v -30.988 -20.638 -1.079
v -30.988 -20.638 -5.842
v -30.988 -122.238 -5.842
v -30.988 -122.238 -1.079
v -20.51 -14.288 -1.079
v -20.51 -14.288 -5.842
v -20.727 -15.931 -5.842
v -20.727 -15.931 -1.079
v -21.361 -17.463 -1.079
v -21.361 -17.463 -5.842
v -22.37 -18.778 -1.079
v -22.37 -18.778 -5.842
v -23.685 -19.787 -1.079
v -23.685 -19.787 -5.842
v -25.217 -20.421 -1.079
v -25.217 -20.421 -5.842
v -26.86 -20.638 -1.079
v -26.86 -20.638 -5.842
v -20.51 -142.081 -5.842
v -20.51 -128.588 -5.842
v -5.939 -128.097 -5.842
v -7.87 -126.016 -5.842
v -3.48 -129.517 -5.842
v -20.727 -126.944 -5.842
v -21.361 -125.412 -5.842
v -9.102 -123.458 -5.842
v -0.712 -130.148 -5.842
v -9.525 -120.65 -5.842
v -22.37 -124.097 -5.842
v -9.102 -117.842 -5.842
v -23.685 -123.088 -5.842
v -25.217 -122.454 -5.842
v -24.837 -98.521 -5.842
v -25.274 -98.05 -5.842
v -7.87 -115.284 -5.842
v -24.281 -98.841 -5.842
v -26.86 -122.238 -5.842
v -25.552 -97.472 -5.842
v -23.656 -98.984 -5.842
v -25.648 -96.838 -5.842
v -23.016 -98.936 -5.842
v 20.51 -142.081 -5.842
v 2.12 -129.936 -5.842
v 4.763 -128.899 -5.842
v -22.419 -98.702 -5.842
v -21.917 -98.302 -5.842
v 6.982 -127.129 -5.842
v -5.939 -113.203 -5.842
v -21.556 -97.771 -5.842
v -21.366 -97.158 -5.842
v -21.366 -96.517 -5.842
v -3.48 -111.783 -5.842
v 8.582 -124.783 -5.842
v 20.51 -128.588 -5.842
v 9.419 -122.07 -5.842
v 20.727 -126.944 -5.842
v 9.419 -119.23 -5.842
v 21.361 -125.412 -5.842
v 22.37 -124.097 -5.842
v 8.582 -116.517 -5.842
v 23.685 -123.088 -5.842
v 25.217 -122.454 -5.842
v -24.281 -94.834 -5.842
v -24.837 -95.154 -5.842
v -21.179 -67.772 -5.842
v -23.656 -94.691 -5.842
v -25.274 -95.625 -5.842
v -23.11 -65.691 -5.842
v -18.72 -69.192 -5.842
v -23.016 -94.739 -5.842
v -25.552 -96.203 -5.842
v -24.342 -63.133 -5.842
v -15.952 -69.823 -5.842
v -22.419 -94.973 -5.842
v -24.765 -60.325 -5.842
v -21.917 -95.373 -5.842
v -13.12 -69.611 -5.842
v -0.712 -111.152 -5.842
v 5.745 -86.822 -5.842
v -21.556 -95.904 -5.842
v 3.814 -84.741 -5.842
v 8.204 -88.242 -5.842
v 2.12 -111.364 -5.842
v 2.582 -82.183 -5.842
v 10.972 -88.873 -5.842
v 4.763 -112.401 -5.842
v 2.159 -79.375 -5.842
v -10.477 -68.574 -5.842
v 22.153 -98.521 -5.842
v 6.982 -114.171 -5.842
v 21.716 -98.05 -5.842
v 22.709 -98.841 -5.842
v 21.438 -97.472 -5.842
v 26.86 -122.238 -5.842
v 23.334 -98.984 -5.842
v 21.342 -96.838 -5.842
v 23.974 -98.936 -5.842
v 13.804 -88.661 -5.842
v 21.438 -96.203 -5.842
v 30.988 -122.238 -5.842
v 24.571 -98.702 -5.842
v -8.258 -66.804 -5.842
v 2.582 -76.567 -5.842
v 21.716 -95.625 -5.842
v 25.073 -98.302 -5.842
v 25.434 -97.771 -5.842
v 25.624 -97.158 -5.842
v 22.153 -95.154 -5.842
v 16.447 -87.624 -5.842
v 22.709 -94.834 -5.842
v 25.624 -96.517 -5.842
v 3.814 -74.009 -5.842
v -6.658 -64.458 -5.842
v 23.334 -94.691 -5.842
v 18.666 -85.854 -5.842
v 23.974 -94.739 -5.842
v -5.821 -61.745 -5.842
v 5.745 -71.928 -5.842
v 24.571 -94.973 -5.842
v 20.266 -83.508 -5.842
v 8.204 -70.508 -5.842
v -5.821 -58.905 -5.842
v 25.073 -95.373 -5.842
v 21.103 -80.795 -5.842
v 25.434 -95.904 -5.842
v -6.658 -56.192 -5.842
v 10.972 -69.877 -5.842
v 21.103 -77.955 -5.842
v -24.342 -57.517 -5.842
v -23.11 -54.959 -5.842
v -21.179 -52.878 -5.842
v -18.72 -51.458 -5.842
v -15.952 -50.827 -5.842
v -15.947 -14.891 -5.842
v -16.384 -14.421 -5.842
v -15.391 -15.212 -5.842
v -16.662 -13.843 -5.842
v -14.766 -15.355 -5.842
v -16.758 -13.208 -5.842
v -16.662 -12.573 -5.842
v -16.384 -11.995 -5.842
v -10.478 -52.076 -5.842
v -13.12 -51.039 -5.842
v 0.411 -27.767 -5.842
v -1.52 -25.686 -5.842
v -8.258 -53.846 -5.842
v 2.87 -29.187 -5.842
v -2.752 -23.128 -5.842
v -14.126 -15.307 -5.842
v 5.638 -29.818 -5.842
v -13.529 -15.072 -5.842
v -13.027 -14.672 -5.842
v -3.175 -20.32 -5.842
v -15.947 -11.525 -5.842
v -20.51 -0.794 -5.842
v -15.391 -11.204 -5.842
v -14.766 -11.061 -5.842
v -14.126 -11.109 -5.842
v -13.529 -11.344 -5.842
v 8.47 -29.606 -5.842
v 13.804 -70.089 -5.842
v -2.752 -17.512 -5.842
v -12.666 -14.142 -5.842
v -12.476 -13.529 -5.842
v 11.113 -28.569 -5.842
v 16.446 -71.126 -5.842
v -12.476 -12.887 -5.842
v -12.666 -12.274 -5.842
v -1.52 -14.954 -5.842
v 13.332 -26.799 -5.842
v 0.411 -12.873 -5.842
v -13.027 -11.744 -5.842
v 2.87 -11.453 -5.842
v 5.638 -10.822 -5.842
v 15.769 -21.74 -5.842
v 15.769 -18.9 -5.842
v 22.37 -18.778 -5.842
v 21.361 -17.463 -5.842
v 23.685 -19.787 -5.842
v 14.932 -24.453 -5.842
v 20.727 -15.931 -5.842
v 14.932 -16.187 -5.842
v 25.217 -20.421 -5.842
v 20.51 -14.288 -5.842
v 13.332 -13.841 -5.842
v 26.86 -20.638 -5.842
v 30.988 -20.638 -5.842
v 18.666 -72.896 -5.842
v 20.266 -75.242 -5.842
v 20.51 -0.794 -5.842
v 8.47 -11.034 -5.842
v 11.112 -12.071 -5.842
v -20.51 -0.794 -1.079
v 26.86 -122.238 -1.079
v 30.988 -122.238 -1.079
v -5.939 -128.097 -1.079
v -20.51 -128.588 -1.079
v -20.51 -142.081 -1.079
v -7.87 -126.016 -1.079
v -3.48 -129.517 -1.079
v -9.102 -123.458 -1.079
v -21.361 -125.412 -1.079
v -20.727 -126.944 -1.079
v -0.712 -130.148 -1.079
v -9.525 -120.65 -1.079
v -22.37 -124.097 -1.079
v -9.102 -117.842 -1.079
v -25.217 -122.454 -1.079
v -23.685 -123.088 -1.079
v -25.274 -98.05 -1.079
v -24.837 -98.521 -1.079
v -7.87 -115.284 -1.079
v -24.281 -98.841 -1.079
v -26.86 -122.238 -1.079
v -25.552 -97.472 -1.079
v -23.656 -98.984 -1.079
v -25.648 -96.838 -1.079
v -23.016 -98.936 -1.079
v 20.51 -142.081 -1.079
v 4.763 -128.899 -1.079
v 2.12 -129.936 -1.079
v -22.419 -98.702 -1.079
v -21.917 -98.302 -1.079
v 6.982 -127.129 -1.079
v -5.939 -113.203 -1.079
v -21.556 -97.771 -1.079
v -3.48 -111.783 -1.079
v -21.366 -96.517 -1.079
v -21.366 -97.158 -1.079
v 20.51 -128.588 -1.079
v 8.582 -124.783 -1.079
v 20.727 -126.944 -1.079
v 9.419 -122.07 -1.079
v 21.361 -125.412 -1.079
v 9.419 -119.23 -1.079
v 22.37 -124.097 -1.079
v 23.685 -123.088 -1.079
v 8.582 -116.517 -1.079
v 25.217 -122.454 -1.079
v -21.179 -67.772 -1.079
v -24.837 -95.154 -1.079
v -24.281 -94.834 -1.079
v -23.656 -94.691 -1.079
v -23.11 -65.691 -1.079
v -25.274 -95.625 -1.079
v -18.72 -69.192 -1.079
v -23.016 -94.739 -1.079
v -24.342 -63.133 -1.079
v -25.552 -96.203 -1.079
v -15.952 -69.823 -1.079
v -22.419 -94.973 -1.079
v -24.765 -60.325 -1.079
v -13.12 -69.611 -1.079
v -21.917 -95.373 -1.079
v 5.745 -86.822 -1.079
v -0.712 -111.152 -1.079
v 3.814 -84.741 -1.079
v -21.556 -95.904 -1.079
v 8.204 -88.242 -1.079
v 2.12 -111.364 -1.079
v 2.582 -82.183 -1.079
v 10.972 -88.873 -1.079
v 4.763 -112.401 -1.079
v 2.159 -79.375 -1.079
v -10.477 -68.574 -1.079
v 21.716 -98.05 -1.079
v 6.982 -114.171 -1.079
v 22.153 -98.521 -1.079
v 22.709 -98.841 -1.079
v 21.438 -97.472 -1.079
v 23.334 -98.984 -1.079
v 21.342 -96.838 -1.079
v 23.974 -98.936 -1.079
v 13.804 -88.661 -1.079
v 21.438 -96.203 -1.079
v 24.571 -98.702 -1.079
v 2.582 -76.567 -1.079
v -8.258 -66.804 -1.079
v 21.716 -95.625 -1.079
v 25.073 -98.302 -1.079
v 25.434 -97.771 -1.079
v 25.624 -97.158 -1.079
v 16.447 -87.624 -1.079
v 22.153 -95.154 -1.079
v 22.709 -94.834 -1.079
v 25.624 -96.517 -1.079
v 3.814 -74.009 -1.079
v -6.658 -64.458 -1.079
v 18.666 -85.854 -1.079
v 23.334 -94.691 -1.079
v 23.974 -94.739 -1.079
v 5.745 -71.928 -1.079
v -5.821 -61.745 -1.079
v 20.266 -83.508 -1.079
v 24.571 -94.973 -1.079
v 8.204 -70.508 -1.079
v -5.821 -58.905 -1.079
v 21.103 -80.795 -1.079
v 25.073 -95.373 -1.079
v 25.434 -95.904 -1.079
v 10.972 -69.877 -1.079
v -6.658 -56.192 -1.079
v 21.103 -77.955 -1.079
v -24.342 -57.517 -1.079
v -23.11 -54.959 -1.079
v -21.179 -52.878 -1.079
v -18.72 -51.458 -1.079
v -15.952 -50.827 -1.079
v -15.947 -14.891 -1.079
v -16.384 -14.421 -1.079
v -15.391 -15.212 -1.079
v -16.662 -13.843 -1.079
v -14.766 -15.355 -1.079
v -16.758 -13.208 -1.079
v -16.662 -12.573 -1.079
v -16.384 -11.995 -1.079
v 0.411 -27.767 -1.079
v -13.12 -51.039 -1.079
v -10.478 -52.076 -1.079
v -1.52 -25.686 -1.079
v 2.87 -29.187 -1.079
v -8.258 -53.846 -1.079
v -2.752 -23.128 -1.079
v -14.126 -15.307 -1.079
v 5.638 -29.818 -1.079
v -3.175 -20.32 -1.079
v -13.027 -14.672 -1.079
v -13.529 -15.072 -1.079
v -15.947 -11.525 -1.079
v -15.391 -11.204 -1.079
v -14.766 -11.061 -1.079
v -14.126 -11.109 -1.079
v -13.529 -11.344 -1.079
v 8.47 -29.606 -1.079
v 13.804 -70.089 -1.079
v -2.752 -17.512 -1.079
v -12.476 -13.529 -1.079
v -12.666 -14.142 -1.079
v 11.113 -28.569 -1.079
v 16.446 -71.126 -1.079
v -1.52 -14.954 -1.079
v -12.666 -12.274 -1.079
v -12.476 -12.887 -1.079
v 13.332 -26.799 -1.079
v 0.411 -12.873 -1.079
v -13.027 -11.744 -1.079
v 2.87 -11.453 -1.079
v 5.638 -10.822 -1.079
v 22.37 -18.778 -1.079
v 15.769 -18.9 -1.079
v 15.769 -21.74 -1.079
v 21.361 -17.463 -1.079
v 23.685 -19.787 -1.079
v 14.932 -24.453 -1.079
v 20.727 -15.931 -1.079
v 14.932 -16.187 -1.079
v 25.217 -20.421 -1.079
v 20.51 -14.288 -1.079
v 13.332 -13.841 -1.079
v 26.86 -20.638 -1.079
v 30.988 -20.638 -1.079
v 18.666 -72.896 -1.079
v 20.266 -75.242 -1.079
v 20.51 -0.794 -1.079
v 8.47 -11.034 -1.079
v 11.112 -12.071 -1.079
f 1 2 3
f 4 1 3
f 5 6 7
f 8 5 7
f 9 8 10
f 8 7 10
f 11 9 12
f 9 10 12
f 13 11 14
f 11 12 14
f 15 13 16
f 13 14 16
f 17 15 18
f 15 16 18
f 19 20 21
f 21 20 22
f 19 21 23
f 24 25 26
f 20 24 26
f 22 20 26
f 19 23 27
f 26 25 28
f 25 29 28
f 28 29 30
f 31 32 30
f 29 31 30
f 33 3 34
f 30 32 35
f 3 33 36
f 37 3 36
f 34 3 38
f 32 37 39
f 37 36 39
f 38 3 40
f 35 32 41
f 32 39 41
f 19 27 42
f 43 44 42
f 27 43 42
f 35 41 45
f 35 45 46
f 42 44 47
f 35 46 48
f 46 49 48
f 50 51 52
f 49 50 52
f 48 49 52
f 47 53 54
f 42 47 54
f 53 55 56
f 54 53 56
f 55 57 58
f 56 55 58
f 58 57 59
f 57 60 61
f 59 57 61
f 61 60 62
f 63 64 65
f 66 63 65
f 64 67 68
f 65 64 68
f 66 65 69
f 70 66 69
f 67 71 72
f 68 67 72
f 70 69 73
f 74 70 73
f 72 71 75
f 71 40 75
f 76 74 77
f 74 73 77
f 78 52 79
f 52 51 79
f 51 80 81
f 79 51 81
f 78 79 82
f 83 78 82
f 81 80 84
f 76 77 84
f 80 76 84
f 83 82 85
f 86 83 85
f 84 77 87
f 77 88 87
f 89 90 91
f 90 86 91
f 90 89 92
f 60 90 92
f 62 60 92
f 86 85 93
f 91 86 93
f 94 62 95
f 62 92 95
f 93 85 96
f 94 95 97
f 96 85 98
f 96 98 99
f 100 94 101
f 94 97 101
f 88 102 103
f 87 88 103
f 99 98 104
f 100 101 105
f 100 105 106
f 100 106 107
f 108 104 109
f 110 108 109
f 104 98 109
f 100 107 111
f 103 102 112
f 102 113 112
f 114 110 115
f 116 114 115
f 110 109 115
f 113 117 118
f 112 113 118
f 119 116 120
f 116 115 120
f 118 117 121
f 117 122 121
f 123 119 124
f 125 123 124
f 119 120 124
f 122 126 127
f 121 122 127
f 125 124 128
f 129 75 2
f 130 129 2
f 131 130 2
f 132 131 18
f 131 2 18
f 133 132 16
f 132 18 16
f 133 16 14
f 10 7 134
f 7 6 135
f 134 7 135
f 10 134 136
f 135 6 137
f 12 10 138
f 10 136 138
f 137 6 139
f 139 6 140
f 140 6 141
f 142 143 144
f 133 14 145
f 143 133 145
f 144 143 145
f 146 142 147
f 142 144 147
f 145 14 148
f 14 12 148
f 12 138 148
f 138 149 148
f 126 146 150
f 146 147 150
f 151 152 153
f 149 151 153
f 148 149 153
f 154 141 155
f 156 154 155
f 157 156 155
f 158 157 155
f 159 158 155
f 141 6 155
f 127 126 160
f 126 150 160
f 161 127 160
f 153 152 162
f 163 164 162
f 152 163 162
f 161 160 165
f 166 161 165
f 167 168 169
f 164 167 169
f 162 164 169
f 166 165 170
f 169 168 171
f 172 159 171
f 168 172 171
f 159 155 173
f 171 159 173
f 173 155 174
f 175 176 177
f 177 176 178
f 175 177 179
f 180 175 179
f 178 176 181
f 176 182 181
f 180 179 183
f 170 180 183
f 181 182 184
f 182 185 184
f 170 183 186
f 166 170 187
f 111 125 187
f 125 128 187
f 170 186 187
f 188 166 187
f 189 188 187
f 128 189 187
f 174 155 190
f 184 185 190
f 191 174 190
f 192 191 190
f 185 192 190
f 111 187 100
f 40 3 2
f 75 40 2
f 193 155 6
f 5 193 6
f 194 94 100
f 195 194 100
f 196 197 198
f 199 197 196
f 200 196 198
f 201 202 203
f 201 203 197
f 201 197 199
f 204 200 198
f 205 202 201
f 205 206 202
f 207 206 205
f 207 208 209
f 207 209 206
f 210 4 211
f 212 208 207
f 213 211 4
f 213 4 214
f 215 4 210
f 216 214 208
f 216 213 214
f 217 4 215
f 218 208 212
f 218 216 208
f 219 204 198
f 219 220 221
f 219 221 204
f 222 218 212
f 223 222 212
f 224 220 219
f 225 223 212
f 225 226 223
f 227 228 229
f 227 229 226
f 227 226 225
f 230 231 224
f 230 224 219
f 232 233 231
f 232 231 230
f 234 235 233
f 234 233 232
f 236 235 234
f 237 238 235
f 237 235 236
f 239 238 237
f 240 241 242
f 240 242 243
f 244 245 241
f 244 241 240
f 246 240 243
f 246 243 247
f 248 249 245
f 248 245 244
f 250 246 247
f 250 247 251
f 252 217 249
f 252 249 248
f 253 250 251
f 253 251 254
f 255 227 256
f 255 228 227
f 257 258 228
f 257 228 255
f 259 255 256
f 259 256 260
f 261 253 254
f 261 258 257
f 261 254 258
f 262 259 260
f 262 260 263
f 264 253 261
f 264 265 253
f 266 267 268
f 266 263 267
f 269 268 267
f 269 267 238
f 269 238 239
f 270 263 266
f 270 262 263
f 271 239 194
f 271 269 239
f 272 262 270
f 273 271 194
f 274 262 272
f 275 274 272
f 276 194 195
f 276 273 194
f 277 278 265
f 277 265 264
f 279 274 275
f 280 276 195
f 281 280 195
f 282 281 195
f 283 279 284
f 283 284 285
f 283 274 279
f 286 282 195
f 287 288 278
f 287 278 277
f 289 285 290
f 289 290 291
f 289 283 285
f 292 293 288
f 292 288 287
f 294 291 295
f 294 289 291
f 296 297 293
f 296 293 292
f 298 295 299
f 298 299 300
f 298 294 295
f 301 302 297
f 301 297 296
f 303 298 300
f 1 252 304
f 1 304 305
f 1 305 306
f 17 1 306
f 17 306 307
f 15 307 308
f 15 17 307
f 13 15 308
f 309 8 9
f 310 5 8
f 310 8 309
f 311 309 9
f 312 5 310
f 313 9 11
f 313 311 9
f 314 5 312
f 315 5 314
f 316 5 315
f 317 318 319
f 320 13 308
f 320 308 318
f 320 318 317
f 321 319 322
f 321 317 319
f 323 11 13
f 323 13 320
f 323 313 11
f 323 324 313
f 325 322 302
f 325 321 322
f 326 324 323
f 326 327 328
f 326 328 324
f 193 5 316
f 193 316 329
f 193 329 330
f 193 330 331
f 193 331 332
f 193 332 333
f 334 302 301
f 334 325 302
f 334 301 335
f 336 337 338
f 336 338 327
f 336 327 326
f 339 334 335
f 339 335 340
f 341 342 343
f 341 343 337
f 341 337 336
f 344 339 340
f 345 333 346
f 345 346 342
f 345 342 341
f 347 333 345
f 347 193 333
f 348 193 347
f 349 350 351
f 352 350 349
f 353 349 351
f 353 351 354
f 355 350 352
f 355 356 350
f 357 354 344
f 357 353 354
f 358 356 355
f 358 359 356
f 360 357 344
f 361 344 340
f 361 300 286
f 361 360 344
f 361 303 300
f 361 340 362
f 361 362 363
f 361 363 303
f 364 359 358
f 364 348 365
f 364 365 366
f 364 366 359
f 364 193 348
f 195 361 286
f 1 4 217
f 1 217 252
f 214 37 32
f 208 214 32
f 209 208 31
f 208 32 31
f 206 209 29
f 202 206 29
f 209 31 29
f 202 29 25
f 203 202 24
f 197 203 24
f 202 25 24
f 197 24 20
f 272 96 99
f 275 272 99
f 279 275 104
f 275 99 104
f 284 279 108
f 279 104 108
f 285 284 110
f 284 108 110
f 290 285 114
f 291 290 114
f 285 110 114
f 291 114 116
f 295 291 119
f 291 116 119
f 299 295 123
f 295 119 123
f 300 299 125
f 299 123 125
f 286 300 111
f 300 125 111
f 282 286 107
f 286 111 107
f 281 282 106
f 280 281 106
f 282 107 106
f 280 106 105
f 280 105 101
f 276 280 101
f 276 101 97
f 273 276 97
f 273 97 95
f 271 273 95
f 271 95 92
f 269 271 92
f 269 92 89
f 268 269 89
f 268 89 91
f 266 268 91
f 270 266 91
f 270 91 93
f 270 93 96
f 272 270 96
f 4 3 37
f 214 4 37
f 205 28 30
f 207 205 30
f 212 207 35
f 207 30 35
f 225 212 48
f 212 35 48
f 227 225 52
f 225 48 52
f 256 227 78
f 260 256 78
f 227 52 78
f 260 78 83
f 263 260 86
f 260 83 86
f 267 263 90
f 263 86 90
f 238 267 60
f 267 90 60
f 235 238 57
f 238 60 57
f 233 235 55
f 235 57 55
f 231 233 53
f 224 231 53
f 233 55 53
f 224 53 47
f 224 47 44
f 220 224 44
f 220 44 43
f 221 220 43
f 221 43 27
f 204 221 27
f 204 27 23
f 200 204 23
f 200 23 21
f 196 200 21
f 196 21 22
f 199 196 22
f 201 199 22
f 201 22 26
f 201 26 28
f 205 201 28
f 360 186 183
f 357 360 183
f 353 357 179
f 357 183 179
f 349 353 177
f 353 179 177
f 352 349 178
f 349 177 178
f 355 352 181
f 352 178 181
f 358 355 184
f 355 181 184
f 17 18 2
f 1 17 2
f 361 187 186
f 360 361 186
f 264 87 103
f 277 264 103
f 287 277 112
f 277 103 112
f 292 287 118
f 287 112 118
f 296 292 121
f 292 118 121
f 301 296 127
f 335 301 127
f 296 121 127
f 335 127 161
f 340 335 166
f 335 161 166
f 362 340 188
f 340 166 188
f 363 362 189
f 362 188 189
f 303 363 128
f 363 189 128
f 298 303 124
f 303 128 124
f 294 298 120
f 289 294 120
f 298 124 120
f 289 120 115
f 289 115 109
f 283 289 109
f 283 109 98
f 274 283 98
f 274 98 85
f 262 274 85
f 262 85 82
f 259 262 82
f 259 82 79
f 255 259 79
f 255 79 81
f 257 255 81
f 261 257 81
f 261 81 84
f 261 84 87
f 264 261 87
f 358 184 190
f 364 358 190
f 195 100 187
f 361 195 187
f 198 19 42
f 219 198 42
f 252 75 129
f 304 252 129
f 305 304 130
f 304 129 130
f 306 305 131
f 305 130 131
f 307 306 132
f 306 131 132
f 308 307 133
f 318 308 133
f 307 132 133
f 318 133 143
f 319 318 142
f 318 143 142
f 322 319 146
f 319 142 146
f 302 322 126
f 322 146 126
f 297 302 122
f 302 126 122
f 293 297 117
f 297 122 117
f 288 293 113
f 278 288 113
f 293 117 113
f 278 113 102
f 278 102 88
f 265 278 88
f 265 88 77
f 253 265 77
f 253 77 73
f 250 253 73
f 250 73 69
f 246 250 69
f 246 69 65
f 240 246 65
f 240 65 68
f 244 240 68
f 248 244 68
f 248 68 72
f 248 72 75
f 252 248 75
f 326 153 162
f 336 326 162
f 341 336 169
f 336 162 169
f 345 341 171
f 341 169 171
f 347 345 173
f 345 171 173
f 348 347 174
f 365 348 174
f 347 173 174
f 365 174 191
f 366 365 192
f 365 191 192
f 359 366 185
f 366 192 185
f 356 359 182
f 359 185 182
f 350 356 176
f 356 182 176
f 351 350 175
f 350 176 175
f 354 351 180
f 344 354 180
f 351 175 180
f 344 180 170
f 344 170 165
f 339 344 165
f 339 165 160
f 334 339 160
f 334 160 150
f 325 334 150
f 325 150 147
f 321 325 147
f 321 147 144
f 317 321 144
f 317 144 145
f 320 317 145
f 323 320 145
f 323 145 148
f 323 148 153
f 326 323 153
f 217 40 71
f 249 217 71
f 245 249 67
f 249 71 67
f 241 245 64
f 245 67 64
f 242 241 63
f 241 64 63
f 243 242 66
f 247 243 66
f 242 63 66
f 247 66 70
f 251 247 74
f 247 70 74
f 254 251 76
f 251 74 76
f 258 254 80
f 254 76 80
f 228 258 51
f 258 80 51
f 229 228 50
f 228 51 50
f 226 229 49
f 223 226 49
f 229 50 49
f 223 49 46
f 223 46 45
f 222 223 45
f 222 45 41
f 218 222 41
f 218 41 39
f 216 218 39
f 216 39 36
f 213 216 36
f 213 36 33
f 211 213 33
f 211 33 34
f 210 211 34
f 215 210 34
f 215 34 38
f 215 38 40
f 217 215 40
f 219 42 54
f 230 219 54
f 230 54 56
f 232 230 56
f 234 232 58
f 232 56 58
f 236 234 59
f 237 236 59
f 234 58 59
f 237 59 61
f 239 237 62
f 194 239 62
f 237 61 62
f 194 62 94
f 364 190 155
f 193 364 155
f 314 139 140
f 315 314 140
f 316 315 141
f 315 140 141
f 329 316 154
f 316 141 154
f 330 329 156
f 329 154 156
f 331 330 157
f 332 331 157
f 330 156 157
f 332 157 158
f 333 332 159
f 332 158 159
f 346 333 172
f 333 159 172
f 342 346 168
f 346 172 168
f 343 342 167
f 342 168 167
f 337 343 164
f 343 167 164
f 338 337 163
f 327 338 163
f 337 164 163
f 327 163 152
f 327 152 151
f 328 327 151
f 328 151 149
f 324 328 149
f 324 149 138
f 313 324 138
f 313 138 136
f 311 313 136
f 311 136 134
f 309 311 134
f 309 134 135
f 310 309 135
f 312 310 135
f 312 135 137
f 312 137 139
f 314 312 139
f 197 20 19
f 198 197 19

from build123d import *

# Parameters (mm, degrees)
BOSS_EXTRUDE1_DEPTH             = 4.7625
F_6_CLEARANCE_HOLE1_D           = 4.3053
F_6_CLEARANCE_HOLE1_DEPTH       = 4.7625
F_3_4_0_75_DIAMETER_HOLE1_D     = 19.05
F_3_4_0_75_DIAMETER_HOLE1_DEPTH = 4.7625


with BuildPart() as part:
    # Sketch1 → Boss-Extrude1 (new body)
    with BuildSketch(Plane.XY.offset(-5.842)):
        with BuildLine():
            Line((-20.5105, -128.5875), (-20.5105, -142.08125))
            Line((-20.5105, -142.08125), (20.5105, -142.08125))
            Line((20.5105, -142.08125), (20.5105, -128.5875))
            ThreePointArc((20.5105, -128.5875), (22.370371939, -124.097371939), (26.8605, -122.2375))
            Line((26.8605, -122.2375), (30.988, -122.2375))
            Line((30.988, -122.2375), (30.988, -20.6375))
            Line((30.988, -20.6375), (26.8605, -20.6375))
            ThreePointArc((26.8605, -20.6375), (22.370371939, -18.777628061), (20.5105, -14.2875))
            Line((20.5105, -14.2875), (20.5105, -0.79375))
            Line((20.5105, -0.79375), (-20.5105, -0.79375))
            Line((-20.5105, -0.79375), (-20.5105, -14.2875))
            ThreePointArc((-20.5105, -14.2875), (-22.370371939, -18.777628061), (-26.8605, -20.6375))
            Line((-26.8605, -20.6375), (-30.988, -20.6375))
            Line((-30.988, -20.6375), (-30.988, -122.2375))
            Line((-30.988, -122.2375), (-26.8605, -122.2375))
            ThreePointArc((-26.8605, -122.2375), (-22.370371939, -124.097371939), (-20.5105, -128.5875))
        make_face()
    extrude(amount=BOSS_EXTRUDE1_DEPTH)

    # #6 Clearance Hole1
    with Locations(Plane.XY.offset(-1.0795)):
        with Locations((-14.605, -13.208), (-23.495, -96.8375), (23.495, -96.8375)):
            Hole(F_6_CLEARANCE_HOLE1_D / 2, depth=F_6_CLEARANCE_HOLE1_DEPTH)

    # 3/4 (0.75) Diameter Hole1
    with Locations(Plane.XY.offset(-1.0795)):
        with Locations((-15.24, -60.325), (6.35, -20.32), (11.684, -79.375), (0, -120.65)):
            Hole(F_3_4_0_75_DIAMETER_HOLE1_D / 2, depth=F_3_4_0_75_DIAMETER_HOLE1_DEPTH)


solid = part.part
